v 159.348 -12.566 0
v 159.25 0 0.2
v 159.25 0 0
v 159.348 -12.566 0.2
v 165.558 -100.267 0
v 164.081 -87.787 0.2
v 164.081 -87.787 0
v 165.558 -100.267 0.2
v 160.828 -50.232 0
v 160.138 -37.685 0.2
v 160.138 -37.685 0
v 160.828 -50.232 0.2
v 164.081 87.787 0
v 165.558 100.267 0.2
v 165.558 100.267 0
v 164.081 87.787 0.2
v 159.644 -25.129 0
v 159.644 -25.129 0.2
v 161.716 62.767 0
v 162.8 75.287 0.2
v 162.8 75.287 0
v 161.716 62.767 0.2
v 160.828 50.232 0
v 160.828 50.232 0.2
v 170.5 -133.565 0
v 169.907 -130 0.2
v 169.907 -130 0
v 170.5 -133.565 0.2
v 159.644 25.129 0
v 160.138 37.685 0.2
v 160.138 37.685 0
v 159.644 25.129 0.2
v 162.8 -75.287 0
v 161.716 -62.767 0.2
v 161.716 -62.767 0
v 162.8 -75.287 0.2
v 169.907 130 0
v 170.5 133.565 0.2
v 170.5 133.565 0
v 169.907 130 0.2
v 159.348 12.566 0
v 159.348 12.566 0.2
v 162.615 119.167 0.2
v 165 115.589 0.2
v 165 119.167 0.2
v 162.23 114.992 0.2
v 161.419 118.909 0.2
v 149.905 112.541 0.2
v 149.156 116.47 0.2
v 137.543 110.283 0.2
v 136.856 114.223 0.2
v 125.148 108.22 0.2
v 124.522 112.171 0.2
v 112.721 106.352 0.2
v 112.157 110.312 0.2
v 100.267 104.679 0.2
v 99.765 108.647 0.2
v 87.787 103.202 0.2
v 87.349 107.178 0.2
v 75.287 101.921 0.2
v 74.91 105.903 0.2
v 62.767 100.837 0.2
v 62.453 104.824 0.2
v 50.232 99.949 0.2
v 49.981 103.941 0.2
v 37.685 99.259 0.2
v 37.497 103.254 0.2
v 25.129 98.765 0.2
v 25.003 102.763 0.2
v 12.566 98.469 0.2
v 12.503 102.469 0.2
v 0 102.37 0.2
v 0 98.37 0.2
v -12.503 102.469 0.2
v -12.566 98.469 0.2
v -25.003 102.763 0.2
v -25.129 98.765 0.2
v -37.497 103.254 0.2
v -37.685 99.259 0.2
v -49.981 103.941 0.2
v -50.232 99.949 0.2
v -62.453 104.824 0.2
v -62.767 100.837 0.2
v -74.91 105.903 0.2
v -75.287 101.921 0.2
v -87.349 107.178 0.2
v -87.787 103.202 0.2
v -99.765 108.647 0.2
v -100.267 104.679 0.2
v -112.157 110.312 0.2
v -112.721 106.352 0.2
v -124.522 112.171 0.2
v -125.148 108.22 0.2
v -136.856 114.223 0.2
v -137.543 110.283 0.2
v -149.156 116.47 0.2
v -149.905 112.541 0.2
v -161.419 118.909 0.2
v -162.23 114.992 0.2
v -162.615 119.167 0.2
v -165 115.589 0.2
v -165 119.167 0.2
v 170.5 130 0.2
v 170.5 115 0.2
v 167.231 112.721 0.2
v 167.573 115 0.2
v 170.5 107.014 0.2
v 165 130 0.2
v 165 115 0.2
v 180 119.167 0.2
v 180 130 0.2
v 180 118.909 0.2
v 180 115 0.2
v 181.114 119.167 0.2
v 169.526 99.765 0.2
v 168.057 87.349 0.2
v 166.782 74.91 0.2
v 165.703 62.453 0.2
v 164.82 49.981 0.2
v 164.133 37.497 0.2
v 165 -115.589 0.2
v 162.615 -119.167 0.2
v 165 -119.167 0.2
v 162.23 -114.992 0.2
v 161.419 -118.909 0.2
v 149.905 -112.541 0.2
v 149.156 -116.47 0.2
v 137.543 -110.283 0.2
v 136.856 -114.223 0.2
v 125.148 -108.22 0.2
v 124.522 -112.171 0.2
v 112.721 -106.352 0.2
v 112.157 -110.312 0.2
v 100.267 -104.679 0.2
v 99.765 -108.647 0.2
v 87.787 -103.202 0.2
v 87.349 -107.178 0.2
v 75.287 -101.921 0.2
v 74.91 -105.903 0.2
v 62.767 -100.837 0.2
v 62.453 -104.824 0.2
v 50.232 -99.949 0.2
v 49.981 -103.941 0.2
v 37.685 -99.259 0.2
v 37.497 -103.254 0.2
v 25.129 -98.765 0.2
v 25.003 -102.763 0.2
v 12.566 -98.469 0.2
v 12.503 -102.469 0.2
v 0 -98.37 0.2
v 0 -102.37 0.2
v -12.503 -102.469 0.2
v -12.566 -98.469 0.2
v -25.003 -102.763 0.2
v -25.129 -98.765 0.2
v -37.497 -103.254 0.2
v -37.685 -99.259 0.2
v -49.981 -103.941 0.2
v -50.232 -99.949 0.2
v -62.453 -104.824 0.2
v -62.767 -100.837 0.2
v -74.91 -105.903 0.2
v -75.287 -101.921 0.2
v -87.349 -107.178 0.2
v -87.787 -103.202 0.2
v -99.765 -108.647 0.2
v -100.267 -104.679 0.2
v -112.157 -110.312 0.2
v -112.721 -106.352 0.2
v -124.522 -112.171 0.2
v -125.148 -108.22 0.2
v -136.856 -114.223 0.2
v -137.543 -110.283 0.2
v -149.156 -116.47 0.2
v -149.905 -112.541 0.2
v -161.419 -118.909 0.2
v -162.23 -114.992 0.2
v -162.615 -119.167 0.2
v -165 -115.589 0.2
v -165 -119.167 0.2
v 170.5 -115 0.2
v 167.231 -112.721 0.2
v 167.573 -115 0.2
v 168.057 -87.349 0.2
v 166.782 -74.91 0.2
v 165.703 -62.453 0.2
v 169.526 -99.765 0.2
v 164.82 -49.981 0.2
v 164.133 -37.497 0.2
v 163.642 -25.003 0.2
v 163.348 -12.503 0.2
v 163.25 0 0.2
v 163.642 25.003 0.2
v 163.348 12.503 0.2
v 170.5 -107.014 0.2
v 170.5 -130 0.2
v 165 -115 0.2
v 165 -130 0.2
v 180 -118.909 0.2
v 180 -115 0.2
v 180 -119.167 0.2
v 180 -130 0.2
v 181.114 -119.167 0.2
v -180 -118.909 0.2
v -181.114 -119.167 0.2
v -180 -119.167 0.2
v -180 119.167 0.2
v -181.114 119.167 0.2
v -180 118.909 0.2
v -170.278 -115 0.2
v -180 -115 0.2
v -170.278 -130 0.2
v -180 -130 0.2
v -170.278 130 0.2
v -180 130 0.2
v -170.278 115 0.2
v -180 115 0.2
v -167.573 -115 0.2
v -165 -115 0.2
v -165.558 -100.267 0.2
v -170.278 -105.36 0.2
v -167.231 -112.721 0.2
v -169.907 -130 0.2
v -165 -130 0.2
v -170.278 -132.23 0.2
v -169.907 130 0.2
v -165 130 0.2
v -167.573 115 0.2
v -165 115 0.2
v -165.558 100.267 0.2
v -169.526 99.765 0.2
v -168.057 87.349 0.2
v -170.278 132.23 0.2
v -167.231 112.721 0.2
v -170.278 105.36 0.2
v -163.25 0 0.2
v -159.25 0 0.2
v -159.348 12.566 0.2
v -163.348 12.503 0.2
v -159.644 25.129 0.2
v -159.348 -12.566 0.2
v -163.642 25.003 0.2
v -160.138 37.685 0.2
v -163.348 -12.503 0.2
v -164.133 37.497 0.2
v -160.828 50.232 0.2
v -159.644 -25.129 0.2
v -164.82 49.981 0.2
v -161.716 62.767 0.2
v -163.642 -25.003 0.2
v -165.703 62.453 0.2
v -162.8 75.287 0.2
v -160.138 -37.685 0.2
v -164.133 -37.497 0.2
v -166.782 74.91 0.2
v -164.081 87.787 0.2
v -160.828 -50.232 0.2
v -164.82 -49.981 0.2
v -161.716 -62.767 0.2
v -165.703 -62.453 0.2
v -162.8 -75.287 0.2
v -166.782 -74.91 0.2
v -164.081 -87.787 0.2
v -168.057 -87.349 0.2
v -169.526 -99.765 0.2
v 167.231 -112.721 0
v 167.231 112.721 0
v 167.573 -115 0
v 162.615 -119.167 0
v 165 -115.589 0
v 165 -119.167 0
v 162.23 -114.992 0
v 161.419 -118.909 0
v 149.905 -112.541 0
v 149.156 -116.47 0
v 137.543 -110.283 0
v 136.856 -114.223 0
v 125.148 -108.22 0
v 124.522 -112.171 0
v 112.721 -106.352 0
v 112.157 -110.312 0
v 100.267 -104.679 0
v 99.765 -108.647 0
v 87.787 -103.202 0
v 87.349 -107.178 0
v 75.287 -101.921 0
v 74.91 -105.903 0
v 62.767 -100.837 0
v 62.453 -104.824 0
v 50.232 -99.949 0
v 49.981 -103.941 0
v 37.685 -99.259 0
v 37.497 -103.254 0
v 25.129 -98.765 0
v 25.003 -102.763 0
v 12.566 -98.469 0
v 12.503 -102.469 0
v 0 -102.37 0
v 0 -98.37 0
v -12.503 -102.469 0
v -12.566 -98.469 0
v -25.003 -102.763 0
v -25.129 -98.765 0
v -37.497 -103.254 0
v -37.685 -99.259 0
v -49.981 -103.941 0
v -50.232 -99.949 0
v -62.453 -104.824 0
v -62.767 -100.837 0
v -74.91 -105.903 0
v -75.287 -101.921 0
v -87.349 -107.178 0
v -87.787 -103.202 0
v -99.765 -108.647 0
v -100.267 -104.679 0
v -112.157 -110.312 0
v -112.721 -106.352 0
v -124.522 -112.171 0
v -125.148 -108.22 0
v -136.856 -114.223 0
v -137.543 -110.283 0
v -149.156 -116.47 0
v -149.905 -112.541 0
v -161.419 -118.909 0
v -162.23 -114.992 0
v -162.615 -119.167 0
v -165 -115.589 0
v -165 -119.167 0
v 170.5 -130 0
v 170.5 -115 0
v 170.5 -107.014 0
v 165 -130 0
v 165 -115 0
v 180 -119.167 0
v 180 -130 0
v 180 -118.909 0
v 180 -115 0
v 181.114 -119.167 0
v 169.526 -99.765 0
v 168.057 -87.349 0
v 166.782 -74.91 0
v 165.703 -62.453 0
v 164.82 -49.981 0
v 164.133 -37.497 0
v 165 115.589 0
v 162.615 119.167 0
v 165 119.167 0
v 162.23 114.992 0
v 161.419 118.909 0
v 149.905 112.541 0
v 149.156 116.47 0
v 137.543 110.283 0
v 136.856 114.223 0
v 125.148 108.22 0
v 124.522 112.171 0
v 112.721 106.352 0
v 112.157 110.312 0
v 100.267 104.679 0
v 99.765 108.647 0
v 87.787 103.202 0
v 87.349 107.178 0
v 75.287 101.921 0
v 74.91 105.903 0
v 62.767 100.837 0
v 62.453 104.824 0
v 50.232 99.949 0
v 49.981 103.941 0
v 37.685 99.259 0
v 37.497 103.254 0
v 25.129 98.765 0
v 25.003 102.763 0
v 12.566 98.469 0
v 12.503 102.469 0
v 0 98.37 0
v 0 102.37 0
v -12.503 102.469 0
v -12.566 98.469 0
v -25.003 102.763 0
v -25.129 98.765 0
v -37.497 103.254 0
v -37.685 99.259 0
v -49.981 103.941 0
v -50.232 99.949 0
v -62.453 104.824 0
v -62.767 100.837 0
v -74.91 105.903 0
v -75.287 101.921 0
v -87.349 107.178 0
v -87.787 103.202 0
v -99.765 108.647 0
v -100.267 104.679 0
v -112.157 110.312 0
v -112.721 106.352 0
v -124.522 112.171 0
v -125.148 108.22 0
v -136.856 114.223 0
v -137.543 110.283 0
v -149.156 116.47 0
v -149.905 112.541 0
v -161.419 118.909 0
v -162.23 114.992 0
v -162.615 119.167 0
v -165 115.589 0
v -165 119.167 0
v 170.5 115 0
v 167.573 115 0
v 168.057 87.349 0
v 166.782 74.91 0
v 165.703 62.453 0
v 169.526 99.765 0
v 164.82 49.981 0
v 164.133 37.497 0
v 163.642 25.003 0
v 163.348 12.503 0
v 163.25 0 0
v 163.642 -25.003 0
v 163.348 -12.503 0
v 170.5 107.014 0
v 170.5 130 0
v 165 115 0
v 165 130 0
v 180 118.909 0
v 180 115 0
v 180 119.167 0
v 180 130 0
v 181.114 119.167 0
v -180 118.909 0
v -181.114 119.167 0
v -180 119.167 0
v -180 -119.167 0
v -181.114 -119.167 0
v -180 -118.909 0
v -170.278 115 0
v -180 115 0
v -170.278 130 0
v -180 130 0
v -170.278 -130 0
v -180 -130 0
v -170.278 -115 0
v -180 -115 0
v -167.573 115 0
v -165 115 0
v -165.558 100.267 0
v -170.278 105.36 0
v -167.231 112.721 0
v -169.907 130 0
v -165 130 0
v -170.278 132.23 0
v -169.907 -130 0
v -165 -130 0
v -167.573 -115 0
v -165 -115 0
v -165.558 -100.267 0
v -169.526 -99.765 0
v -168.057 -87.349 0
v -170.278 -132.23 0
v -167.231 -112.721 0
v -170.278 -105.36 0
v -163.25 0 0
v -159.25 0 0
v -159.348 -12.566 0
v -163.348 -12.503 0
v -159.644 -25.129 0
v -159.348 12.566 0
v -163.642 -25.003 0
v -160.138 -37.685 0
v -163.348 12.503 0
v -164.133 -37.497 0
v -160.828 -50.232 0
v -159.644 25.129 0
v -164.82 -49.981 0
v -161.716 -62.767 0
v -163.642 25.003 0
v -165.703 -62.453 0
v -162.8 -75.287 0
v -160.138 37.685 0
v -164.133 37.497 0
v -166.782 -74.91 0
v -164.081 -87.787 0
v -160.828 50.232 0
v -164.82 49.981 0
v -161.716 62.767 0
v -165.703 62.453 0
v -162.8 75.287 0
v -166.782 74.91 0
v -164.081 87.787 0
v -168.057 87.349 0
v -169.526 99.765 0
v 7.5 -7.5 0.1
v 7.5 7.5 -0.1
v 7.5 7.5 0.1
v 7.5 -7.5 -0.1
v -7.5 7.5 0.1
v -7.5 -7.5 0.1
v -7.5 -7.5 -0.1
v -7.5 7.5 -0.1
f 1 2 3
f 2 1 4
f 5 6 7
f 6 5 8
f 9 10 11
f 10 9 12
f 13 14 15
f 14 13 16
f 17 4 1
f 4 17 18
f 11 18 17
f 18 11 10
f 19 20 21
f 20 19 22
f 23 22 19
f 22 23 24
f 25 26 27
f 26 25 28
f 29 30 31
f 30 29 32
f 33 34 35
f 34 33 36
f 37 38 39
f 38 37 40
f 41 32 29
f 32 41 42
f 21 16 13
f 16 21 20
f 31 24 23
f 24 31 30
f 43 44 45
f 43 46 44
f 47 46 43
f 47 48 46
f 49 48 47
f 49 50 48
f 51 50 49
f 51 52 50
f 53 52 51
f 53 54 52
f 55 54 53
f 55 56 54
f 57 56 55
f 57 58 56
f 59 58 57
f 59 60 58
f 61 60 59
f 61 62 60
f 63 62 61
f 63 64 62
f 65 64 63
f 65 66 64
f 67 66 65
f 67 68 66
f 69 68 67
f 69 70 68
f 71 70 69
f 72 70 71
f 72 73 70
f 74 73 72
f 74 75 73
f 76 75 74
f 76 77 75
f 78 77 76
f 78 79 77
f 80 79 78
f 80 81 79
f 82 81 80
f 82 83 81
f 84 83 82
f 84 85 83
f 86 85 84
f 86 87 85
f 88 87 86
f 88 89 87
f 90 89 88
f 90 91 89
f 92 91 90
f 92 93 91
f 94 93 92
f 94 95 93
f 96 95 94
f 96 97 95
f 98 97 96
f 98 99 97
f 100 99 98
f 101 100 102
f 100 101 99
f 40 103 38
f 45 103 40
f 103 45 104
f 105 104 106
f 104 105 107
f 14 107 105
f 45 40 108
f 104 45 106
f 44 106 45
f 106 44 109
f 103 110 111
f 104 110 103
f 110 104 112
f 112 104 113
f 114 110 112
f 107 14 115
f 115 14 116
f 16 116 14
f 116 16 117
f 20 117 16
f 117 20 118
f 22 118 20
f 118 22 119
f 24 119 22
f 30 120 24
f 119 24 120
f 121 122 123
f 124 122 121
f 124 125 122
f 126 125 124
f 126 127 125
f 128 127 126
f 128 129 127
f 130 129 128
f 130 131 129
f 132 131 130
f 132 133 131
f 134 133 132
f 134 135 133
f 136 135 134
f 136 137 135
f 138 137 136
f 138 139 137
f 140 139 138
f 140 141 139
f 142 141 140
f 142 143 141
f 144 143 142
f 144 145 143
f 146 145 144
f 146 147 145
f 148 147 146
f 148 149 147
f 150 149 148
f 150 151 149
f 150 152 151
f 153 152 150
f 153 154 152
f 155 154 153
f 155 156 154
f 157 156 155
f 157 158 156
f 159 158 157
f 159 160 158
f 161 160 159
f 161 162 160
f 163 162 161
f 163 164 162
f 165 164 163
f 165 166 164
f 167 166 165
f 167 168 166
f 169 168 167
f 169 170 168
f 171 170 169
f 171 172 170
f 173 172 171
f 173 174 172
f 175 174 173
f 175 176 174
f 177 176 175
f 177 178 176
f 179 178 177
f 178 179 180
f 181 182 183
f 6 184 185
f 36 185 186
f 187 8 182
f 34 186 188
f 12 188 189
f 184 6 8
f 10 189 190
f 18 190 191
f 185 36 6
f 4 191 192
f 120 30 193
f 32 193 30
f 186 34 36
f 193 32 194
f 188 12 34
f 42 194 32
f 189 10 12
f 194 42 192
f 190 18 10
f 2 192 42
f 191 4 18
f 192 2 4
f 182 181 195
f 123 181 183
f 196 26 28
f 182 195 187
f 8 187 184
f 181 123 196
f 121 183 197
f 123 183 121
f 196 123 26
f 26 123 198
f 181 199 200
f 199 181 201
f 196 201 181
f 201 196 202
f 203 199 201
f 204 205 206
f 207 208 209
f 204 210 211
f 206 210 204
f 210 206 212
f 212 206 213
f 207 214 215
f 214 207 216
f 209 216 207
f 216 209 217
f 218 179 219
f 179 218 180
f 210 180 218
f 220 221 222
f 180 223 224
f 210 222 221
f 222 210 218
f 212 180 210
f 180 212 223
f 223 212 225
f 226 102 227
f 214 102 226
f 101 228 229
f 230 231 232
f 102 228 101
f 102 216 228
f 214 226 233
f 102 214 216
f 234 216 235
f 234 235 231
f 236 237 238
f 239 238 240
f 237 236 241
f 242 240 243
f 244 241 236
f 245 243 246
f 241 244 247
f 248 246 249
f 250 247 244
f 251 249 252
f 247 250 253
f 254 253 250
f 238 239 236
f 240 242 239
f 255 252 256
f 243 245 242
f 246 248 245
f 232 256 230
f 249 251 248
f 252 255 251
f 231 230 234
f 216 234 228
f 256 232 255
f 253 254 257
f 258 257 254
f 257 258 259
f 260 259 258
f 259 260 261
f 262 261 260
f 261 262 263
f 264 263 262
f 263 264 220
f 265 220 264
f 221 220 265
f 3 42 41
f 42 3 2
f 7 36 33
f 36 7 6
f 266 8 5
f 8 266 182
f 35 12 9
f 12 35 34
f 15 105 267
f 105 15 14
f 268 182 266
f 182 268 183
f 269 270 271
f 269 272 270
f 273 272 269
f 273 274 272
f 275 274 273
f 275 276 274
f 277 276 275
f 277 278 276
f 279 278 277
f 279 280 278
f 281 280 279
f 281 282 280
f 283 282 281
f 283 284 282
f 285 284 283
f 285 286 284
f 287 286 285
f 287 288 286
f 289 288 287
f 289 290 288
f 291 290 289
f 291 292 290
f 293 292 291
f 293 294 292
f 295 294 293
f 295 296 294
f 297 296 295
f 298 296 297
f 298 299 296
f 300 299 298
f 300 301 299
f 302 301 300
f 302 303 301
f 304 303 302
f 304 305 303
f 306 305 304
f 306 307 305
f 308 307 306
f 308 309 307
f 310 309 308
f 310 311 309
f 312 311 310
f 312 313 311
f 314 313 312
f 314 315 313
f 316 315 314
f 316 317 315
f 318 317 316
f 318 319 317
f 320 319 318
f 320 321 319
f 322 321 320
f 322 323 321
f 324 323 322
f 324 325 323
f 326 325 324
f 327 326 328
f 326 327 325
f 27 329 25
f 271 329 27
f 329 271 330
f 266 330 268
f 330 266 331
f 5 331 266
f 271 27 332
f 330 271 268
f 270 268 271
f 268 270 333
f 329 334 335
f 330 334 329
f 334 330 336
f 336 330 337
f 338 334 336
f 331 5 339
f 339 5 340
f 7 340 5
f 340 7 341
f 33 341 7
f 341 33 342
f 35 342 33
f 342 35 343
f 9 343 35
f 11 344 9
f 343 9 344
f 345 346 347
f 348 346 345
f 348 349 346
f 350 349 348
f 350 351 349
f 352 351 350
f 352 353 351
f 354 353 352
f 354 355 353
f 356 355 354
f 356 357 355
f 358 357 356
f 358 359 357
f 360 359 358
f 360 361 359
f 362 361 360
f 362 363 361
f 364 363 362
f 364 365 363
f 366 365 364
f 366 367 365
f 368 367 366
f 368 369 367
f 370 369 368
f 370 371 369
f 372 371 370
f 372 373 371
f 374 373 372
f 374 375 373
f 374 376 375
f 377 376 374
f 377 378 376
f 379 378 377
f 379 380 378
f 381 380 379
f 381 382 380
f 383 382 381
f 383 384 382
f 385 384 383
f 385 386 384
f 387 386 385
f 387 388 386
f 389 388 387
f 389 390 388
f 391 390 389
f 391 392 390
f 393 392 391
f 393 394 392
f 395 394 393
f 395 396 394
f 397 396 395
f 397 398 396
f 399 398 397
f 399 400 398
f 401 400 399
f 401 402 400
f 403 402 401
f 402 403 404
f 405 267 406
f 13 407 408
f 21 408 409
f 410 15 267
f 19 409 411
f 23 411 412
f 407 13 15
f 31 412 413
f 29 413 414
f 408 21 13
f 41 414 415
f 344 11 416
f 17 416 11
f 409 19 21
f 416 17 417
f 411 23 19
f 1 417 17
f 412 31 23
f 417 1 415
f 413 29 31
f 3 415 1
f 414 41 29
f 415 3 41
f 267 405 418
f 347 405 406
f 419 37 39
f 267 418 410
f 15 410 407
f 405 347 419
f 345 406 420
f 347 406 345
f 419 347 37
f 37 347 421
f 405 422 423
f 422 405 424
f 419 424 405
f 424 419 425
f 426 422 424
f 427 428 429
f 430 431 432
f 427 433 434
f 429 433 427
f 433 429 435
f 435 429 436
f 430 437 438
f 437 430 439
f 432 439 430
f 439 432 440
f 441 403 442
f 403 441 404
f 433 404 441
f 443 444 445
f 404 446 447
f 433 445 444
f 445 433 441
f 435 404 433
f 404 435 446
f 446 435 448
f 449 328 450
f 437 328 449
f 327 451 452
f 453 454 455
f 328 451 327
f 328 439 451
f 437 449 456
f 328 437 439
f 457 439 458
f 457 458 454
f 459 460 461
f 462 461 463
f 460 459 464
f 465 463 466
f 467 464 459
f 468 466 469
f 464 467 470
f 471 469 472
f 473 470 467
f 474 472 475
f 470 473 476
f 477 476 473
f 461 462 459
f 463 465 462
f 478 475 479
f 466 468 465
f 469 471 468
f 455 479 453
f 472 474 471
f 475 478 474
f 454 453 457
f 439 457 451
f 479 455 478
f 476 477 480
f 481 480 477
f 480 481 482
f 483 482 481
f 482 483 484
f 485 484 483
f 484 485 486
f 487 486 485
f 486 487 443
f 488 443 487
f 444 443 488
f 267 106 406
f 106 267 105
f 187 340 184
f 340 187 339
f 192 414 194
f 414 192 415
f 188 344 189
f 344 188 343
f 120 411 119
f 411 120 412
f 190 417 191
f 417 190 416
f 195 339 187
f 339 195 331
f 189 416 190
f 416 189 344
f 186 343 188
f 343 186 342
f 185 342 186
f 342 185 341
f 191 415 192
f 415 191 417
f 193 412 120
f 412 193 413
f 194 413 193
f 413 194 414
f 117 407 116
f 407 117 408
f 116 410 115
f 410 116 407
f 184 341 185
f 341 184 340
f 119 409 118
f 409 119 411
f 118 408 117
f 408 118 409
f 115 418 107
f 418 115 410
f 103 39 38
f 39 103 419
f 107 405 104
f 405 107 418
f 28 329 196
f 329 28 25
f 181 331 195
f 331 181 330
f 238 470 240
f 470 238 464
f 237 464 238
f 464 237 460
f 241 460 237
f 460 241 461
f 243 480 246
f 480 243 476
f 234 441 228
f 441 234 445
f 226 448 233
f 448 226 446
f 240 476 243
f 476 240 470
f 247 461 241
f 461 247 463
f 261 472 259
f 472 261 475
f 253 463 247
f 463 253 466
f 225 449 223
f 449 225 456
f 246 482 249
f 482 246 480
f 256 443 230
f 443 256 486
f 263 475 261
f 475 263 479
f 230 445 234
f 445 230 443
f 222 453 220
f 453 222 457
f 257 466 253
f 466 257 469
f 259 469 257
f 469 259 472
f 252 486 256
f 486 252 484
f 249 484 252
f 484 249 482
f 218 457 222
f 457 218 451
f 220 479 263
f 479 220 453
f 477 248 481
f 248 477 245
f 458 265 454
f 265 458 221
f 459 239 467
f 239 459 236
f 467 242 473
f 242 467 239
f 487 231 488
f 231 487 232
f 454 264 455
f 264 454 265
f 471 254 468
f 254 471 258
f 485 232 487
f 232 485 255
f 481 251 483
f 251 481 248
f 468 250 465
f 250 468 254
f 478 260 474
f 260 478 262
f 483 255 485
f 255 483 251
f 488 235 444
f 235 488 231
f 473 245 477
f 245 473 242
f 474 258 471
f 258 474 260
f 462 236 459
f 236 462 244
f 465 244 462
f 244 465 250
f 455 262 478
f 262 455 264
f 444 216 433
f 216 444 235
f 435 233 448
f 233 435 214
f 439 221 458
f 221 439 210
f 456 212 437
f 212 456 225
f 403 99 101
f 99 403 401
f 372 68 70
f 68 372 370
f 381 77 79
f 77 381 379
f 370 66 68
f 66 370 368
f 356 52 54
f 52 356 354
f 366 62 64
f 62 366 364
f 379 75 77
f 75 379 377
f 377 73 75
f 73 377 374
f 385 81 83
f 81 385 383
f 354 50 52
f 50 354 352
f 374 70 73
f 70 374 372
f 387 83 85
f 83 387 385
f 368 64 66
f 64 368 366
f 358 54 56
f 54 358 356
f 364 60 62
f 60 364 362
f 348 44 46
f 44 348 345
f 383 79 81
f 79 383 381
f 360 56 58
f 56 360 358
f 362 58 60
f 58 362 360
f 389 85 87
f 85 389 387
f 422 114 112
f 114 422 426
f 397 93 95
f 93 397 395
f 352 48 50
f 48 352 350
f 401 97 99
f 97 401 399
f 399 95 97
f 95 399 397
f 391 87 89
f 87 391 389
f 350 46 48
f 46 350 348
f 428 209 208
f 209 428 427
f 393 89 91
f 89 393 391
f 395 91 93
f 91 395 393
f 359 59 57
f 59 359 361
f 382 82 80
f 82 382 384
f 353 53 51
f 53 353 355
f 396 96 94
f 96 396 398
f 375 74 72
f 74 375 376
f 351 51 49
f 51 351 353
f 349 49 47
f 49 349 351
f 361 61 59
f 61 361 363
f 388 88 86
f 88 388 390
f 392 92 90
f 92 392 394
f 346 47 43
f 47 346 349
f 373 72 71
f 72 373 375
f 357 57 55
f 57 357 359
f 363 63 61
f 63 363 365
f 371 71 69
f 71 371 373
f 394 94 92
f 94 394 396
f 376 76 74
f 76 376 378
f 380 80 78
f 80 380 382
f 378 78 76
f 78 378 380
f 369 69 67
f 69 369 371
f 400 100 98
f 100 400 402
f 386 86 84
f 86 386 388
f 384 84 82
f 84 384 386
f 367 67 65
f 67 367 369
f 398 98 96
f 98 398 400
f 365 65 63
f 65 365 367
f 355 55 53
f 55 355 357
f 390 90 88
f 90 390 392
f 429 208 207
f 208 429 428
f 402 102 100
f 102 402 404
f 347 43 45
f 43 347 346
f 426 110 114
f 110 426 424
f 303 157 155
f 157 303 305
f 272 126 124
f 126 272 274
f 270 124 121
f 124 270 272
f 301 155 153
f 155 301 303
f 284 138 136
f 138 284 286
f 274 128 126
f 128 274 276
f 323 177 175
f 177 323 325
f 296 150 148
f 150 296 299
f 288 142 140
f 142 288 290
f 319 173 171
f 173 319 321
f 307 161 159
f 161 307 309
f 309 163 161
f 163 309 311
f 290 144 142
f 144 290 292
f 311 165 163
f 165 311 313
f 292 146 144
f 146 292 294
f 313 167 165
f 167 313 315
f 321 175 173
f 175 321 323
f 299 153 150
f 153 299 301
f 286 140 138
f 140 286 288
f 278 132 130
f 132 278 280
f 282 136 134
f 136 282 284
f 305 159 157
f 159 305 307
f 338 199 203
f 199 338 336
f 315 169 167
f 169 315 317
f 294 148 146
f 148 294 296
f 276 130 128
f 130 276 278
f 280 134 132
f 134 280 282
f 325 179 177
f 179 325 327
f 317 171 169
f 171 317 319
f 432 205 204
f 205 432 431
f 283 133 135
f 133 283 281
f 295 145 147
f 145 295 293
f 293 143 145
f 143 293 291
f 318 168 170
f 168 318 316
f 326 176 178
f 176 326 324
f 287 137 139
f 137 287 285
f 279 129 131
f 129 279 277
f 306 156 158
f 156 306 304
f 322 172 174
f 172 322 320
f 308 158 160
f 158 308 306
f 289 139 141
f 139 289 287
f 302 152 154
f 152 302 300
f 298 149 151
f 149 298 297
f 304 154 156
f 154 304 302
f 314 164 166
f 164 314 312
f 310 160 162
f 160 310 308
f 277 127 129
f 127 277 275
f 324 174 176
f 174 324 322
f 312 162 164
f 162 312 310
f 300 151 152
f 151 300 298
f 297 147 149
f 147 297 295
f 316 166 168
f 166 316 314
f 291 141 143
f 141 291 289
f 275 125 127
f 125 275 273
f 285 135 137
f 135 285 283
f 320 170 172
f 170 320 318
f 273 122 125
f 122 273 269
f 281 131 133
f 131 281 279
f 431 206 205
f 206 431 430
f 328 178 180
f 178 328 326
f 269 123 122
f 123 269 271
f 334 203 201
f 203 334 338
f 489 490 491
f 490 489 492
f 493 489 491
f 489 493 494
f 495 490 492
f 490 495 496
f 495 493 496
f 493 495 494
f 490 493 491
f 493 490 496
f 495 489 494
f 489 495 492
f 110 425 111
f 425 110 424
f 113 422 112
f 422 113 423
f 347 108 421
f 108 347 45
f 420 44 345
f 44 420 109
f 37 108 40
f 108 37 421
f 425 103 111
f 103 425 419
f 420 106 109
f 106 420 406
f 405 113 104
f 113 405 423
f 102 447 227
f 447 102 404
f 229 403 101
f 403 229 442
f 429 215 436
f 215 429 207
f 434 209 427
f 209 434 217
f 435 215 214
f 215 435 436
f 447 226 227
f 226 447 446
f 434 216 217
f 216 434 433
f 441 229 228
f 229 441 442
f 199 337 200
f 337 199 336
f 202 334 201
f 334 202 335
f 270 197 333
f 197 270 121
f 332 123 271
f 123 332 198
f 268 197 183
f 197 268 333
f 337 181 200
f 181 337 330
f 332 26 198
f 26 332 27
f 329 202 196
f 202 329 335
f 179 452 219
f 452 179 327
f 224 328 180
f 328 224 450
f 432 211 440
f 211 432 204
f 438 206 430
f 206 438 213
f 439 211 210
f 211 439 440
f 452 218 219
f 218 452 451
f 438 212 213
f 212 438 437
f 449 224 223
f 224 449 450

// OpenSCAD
offset = 20;
cw = 15;
bedx = 400;
bedy = 300;
d = .2;
cube([cw,cw,d], center = true);
translate( [bedx/2-cw/2-offset, bedy/2-cw/2-offset,d/2] )cube([15,15,d], center = true);
translate( [-bedx/2+cw/2+offset, bedy/2-cw/2-offset,d/2] )cube([15,15,d], center = true);

translate( [bedx/2-cw/2-offset, -bedy/2+cw/2+offset,d/2] )cube([15,15,d], center = true);
translate( [-bedx/2+cw/2+offset, -bedy/2+cw/2+offset,d/2] )cube([15,15,d], center = true);


rad = 2*bedx;
alpha = asin((bedy-offset/2)/(2*rad));
deltax = rad*cos(alpha);
beta = asin((bedx-offset/2)/(2*rad));
deltay = rad*cos(beta);
//echo(str("alpha ",alpha," dx = ",deltax, " a sin de 1 " , asin(1)));

//x boegen
 // color("red")
  translate( [(bedx-cw-2*offset)/2+deltax, 0,0] ) 
union()
{
  difference()
  {
    cylinder(r=rad, h=d,$fn=400);
    union()
      translate( [0, 0,-d/2] ) cylinder(r=rad-4,h=2*d, $fn=400);
    translate( [(rad-deltax-offset/10), 0,-0.1] ) cube([2*rad,3*rad,4*d],center = true);
  }

}

  color("red")
  translate( [(-bedx+cw+2*offset)/2-deltax, 0,0] ) 
union()
{
  difference()
  {
    cylinder(r=rad, h=d,$fn=400);
    union()
      translate( [0, 0,-d/2] ) cylinder(r=rad-4,h=2*d, $fn=400);
    translate( [-(rad-deltax-offset/9), 0,-d/2] ) cube([2*rad,3*rad,4*d],center = true);
  }

}

//y boegen
  color("red")
translate( [0,(bedy-cw-2*offset)/2+deltay, 0] ) 
union()
{
  difference()
  {
    cylinder(r=rad, h=d,$fn=400);
    union()
      translate( [0, 0,-d/2] ) cylinder(r=rad-4,h=2*d, $fn=400);
    translate( [ 0,(rad-deltay-offset/6),-d/2] ) cube([3*rad,2*rad,4*d],center = true);
  }
}

  color("red")
  translate( [0,(-bedy+cw+2*offset)/2-deltay, 0] ) 
union()
{
  difference()
  {
    cylinder(r=rad, h=d,$fn=400);
    union()
      translate( [0, 0,-d/2] ) cylinder(r=rad-4,h=2*d, $fn=400);
    translate( [ 0,-(rad-deltay-offset/6),-d/2] ) cube([3*rad,2*rad,4*d],center = true);
  }
}
